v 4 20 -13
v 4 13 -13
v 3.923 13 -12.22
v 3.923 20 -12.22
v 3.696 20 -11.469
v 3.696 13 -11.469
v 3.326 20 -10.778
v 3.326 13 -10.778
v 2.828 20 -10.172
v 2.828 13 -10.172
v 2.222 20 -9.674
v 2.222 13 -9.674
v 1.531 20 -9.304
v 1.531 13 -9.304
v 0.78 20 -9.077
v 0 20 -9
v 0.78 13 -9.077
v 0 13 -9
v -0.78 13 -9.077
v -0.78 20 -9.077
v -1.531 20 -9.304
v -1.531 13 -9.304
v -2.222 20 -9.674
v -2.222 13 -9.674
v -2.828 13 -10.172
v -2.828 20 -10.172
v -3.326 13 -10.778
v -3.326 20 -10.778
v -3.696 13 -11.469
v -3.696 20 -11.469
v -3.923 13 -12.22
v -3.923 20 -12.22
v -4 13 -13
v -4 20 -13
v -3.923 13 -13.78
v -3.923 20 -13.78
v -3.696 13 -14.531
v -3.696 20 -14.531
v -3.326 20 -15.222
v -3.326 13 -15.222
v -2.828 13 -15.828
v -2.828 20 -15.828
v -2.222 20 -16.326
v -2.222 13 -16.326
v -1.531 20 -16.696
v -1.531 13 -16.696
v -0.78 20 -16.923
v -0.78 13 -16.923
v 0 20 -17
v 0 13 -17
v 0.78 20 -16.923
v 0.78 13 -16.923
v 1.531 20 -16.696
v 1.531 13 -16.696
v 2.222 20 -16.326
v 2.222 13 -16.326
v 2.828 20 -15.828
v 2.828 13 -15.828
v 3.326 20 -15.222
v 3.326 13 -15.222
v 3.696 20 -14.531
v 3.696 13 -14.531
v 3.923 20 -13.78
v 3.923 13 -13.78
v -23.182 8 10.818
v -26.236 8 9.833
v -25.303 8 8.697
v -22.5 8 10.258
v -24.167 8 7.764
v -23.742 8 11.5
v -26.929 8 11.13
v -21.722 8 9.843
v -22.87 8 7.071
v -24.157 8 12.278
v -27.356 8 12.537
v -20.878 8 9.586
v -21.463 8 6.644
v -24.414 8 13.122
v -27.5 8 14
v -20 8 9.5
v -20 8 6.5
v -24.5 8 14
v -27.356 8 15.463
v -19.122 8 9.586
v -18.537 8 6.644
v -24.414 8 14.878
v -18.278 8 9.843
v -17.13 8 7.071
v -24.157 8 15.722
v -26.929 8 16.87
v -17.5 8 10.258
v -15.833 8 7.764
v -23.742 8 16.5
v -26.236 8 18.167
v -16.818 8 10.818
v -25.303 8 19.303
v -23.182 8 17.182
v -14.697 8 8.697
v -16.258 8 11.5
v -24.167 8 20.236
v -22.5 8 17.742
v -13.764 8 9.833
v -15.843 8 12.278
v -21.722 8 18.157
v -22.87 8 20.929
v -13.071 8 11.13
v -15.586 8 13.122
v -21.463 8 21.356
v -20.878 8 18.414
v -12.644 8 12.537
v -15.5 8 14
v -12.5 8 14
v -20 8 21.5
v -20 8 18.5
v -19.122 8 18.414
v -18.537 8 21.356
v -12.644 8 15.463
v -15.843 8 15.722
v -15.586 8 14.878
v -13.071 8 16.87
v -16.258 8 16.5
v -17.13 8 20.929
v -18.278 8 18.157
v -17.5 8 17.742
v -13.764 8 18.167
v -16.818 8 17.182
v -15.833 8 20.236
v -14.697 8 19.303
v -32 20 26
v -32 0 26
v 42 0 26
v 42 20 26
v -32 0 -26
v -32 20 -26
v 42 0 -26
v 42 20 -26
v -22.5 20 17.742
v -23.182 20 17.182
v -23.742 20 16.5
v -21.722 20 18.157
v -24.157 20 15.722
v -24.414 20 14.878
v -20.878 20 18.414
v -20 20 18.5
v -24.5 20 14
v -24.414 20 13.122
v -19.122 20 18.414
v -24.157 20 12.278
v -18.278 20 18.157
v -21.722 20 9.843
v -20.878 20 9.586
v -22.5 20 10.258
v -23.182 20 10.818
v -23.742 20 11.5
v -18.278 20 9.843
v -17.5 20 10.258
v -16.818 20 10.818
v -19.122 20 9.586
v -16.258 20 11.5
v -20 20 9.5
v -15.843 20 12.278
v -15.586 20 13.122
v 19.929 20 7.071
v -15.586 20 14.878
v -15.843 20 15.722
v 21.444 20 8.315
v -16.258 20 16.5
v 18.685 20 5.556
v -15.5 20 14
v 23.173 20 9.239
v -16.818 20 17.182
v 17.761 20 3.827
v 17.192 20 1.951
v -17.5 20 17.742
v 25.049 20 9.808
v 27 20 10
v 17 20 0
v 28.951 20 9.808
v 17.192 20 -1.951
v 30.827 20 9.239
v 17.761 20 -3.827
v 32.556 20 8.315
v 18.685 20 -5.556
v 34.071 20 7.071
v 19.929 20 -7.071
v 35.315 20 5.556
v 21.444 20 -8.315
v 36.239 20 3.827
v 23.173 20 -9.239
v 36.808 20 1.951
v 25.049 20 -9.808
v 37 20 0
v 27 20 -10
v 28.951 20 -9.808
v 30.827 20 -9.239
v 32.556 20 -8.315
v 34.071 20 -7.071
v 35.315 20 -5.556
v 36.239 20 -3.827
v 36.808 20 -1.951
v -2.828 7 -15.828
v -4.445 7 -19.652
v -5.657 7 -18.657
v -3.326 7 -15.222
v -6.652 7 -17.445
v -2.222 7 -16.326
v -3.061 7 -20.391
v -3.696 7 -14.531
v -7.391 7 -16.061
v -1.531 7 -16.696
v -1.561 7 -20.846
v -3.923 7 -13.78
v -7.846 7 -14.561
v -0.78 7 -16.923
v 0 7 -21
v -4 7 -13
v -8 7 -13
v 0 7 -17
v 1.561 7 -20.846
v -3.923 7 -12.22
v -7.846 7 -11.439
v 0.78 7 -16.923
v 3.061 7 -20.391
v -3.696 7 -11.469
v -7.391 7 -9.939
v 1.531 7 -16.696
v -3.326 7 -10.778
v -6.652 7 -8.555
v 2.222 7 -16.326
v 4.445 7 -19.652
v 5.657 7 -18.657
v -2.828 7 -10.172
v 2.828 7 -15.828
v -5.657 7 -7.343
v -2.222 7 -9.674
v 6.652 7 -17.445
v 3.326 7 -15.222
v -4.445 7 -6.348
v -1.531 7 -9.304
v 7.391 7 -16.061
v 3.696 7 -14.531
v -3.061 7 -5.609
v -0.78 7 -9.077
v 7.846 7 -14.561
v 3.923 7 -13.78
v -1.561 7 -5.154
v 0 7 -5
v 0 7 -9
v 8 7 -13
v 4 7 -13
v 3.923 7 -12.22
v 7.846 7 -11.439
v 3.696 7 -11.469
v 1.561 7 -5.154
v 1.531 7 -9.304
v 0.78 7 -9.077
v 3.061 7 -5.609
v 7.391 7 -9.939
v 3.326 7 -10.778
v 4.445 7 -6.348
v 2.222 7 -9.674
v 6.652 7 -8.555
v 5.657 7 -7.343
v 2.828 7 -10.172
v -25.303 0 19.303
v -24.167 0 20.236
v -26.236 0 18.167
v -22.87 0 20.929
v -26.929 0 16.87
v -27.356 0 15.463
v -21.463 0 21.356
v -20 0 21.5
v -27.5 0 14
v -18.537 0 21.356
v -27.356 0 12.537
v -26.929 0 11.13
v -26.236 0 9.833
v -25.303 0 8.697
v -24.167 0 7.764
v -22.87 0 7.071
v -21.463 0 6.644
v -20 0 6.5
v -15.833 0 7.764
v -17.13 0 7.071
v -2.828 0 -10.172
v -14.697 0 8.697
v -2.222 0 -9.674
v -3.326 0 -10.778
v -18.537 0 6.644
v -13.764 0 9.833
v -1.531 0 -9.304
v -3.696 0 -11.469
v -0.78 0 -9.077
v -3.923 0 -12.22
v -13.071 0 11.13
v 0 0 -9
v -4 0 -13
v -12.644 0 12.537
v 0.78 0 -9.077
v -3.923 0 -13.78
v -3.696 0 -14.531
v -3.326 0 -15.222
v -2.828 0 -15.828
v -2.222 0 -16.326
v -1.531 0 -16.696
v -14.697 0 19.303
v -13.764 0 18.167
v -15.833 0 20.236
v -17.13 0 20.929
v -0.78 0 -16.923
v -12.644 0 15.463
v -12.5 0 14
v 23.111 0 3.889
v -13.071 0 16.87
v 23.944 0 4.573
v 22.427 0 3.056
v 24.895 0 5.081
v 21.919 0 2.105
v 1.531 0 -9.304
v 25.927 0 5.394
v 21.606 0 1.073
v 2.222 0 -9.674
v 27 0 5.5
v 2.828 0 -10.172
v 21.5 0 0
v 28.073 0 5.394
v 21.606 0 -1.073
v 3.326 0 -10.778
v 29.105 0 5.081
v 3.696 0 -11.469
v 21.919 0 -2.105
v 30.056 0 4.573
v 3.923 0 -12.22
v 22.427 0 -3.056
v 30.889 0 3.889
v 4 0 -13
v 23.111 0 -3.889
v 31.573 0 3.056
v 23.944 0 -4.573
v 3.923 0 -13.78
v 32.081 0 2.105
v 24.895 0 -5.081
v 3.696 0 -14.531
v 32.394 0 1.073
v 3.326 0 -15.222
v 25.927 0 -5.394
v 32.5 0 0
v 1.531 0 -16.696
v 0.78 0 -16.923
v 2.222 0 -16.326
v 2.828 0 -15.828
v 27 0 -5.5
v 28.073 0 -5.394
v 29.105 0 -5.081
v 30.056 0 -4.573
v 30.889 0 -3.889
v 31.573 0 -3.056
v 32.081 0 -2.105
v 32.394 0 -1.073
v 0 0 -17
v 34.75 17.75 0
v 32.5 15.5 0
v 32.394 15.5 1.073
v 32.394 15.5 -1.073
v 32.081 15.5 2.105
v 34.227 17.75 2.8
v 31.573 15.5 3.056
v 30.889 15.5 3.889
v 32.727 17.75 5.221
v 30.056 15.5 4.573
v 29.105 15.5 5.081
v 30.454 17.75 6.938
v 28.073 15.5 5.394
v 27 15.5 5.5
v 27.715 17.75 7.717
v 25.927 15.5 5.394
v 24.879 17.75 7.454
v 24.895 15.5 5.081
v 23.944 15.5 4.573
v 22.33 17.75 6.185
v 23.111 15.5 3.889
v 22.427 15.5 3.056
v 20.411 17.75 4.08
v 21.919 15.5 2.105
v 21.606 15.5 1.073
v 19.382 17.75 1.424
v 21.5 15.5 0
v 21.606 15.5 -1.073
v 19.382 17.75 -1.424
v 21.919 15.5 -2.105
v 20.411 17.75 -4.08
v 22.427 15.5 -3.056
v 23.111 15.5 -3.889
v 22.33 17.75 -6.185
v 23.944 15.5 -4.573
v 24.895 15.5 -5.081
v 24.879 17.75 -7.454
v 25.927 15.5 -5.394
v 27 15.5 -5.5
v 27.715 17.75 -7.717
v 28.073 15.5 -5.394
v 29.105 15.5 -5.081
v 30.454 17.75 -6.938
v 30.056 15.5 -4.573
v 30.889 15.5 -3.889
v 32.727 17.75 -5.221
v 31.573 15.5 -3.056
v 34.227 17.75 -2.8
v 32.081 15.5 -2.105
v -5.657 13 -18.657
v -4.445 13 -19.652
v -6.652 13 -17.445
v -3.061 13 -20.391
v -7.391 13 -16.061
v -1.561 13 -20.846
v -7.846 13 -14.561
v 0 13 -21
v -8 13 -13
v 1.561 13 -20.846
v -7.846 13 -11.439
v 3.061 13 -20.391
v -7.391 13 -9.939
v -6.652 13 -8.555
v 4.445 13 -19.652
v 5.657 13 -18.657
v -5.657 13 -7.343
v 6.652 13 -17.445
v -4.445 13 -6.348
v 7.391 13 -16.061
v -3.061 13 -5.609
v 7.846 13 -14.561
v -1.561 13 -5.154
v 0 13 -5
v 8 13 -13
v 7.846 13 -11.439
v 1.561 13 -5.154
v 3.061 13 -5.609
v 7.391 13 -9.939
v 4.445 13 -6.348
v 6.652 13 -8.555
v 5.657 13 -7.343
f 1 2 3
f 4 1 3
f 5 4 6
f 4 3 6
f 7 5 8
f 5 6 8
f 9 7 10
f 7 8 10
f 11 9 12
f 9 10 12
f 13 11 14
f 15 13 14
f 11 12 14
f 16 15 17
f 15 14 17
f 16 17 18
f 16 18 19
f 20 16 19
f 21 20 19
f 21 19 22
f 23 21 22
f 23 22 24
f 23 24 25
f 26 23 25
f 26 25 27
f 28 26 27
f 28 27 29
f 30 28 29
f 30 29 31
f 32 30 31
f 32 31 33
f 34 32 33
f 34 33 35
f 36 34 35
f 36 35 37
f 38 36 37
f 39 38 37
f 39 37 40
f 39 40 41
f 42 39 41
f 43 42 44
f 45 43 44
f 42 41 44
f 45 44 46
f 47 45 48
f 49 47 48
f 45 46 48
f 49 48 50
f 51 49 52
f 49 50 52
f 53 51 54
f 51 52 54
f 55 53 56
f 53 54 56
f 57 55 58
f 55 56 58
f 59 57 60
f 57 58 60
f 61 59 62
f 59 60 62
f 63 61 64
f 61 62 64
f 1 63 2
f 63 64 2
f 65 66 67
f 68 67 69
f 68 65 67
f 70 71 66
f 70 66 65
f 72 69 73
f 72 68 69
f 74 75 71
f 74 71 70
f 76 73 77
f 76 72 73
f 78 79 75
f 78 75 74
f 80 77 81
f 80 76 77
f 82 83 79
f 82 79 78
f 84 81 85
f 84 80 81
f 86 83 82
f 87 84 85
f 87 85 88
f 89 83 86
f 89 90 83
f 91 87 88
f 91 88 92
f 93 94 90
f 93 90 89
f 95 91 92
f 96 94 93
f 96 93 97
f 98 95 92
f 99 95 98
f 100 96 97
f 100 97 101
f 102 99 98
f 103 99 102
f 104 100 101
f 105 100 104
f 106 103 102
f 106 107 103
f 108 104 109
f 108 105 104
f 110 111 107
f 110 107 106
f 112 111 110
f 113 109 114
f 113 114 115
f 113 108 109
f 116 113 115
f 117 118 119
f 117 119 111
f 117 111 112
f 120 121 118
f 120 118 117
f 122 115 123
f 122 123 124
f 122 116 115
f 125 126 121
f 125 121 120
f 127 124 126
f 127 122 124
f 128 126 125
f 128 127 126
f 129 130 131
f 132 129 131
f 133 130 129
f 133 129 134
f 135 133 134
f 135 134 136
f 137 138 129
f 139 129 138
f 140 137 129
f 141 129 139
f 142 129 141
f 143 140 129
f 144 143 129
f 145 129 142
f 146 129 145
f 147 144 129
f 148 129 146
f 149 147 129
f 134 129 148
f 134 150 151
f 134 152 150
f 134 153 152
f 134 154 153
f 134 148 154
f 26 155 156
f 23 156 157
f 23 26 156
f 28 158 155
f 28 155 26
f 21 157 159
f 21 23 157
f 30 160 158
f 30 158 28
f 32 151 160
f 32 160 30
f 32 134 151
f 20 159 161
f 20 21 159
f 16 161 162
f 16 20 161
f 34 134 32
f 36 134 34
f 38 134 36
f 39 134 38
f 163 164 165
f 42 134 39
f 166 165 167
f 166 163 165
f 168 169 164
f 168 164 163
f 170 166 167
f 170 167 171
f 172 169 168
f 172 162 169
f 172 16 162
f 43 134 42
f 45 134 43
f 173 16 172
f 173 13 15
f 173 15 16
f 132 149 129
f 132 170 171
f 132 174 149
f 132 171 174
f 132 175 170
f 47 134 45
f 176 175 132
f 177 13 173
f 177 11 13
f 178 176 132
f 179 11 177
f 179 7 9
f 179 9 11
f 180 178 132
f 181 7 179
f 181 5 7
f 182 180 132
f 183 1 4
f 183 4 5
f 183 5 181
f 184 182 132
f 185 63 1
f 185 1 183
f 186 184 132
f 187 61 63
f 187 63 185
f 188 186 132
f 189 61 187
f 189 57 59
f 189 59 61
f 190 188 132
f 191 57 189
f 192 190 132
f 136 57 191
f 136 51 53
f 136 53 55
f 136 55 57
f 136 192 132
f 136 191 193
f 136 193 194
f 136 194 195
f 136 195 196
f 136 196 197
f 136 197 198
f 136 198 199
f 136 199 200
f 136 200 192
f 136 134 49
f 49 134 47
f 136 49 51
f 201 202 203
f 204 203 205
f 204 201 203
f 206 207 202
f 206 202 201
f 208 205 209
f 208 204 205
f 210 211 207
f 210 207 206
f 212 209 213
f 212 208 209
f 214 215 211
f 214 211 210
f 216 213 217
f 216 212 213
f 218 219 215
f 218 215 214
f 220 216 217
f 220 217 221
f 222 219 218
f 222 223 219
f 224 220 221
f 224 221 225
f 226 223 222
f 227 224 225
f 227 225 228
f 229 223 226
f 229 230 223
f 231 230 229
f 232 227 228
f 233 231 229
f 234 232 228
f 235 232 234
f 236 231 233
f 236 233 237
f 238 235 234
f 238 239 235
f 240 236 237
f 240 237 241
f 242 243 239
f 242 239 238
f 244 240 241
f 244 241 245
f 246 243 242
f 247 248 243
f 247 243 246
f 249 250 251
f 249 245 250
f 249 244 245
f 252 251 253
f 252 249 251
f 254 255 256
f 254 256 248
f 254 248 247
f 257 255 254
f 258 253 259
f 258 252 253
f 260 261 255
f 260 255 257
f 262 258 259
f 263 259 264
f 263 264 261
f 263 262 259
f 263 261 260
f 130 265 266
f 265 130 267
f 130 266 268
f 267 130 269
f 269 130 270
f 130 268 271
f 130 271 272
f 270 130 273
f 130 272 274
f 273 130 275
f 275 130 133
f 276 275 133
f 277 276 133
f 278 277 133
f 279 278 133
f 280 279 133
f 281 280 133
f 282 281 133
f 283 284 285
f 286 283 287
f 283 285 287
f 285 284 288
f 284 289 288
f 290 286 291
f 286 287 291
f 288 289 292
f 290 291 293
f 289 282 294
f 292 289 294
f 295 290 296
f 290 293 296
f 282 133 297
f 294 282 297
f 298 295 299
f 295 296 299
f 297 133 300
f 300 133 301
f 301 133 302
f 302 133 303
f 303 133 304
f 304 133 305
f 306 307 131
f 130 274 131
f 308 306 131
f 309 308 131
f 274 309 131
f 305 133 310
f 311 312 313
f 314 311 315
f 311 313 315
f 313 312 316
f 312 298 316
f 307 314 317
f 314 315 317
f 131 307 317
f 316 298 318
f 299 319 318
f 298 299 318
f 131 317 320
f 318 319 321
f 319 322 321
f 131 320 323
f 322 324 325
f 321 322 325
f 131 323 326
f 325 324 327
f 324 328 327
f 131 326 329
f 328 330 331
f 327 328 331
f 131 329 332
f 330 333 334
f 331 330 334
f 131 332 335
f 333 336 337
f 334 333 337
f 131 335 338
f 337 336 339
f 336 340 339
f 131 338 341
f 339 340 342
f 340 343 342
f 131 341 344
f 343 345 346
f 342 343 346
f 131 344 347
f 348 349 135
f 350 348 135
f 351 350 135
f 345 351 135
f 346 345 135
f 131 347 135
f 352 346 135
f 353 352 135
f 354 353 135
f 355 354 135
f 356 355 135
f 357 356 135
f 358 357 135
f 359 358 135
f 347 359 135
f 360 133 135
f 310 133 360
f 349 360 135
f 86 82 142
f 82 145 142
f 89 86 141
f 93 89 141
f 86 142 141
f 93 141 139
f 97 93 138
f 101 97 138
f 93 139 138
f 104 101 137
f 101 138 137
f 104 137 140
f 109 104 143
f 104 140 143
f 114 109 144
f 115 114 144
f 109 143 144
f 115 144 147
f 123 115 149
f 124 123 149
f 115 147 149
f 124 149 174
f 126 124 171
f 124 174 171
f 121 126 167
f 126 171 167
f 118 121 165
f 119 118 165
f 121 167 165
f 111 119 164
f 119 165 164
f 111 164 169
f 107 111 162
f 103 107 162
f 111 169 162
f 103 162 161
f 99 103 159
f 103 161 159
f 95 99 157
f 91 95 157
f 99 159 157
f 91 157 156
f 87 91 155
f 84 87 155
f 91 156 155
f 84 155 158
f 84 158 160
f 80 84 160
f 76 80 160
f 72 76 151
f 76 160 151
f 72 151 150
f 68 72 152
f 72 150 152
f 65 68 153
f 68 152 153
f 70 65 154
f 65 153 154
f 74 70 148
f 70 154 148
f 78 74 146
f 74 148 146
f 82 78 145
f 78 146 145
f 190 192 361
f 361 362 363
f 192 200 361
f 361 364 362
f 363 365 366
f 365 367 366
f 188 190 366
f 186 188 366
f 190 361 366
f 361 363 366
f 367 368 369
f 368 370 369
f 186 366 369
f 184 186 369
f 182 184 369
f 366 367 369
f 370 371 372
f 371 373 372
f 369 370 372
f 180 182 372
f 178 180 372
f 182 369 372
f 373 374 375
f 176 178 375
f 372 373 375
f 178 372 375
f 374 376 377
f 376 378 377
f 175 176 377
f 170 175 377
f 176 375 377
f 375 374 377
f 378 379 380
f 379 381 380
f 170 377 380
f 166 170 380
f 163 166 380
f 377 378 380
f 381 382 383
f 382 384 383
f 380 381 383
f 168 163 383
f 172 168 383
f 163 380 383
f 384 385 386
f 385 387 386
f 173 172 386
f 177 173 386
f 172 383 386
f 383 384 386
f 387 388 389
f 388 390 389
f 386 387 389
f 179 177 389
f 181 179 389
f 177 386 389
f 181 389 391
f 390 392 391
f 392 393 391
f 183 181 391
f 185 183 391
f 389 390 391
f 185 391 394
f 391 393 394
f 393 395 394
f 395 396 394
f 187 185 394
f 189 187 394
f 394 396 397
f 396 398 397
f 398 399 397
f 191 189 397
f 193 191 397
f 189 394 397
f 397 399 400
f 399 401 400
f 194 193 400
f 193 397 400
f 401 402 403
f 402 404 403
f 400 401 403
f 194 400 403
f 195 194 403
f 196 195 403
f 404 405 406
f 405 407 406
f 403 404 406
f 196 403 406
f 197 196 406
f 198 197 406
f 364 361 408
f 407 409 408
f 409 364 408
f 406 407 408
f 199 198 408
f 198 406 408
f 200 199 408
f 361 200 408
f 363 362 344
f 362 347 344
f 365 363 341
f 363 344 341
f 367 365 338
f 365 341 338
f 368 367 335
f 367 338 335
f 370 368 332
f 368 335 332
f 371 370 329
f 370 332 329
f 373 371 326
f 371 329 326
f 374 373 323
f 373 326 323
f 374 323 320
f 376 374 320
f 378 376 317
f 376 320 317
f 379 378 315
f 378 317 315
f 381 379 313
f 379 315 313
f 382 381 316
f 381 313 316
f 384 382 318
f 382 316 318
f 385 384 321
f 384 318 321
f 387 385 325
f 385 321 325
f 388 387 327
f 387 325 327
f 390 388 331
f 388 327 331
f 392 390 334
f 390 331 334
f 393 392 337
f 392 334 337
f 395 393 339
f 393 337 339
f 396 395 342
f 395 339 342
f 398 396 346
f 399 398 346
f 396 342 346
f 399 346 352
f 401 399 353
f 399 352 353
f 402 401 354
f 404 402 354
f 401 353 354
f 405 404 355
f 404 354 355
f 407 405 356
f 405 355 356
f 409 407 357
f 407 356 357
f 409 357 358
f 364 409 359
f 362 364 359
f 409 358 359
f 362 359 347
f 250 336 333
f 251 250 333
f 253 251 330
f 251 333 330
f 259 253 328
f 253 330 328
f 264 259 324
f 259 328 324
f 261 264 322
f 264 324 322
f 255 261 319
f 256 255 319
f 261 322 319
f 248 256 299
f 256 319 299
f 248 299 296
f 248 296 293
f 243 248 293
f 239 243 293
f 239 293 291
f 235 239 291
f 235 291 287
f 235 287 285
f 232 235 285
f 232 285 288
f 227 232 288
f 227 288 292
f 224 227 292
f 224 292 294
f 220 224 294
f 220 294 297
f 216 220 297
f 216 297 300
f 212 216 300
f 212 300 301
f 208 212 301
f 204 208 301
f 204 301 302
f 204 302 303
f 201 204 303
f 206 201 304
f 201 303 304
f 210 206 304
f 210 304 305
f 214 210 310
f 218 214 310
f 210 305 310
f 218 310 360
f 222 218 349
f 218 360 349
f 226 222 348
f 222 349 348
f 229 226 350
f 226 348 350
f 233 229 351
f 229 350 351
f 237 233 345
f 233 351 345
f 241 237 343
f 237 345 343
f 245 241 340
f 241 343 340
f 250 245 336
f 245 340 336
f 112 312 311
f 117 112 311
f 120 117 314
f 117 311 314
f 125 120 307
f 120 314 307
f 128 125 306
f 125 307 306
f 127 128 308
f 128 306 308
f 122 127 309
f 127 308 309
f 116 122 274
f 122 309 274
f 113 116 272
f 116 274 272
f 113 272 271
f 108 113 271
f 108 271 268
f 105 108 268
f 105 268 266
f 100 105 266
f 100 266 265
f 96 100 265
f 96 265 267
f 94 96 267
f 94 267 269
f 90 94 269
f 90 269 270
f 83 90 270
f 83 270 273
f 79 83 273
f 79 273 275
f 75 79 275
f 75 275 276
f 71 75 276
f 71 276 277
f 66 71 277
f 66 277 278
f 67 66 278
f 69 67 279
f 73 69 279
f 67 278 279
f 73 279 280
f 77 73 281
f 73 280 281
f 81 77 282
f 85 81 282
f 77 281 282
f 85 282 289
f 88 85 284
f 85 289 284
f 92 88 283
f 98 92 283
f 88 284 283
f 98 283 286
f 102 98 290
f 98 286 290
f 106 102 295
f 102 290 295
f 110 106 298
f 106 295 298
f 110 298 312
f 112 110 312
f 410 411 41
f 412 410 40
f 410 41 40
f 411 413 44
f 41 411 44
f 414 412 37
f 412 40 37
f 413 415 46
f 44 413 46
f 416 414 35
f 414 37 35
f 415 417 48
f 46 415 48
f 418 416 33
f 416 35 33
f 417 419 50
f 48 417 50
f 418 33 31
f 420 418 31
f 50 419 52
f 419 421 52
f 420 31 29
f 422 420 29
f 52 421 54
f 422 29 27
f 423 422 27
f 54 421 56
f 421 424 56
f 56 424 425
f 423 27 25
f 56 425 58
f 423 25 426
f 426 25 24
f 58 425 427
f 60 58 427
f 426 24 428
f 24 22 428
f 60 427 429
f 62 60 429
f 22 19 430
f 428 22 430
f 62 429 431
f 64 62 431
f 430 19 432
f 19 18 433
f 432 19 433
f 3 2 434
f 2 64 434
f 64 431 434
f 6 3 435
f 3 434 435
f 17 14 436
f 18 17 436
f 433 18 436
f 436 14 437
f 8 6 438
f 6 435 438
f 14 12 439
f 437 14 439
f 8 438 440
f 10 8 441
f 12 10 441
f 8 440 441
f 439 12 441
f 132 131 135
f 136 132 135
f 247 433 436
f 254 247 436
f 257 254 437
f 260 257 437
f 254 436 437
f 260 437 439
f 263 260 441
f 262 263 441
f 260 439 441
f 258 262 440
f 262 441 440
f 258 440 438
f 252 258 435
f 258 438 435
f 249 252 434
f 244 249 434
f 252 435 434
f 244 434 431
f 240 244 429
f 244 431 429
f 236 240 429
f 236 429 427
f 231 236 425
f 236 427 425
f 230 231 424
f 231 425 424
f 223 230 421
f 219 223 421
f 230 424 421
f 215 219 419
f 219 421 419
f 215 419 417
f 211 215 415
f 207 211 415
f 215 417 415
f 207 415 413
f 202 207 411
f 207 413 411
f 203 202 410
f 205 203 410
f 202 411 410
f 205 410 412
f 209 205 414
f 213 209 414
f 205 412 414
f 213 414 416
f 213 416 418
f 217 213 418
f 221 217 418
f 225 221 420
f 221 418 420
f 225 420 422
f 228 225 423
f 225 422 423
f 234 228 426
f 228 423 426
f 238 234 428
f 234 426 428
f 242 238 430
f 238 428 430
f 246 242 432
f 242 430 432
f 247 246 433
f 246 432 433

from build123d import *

# Parameters (mm, degrees)
SKETCH1_W                                        = 74
SKETCH1_H                                        = 52
EXTRUDE1_DEPTH                                   = 20
CSK_FOR_M10_FLAT_HEAD_MACHINE_SCREW1_D           = 11
CSK_FOR_M10_FLAT_HEAD_MACHINE_SCREW1_CSINK_D     = 20
CSK_FOR_M10_FLAT_HEAD_MACHINE_SCREW1_CSINK_ANGLE = 90
F_8_0_8_DIAMETER_HOLE1_D                         = 8
CBORE_FOR_M8_SHCS1_D                             = 9
CBORE_FOR_M8_SHCS1_CBORE_D                       = 15
CBORE_FOR_M8_SHCS1_CBORE_DEPTH                   = 8
SKETCH8_R                                        = 8
CUT_EXTRUDE1_DEPTH                               = 6


with BuildPart() as part:
    # Sketch1 → Extrude1 (new body)
    with BuildSketch(Plane(origin=(0, 0, 0), x_dir=(1, 0, 0), z_dir=(0, 1, 0))):
        with Locations((5, 0)):
            Rectangle(SKETCH1_W, SKETCH1_H)
    extrude(amount=EXTRUDE1_DEPTH)

    # CSK for M10 Flat Head Machine Screw1 (through all)
    with Locations(Plane(origin=(0, 20, 0), x_dir=(-1, 0, 0), z_dir=(0, 1, 0))):
        with Locations((-27, 0)):
            CounterSinkHole(CSK_FOR_M10_FLAT_HEAD_MACHINE_SCREW1_D / 2, CSK_FOR_M10_FLAT_HEAD_MACHINE_SCREW1_CSINK_D / 2, counter_sink_angle=CSK_FOR_M10_FLAT_HEAD_MACHINE_SCREW1_CSINK_ANGLE)

    # Ø8.0 (8) Diameter Hole1 (through all)
    with Locations(Plane(origin=(0, 20, 0), x_dir=(-1, 0, 0), z_dir=(0, 1, 0))):
        with Locations((0, -13)):
            Hole(F_8_0_8_DIAMETER_HOLE1_D / 2)

    # CBORE for M8 SHCS1 (through all)
    with Locations(Plane.XZ):
        with Locations((-20, 14)):
            CounterBoreHole(CBORE_FOR_M8_SHCS1_D / 2, CBORE_FOR_M8_SHCS1_CBORE_D / 2, CBORE_FOR_M8_SHCS1_CBORE_DEPTH)

    # Sketch8 → Cut-Extrude1 (cut)
    with BuildSketch(Plane(origin=(0, 13, 0), x_dir=(-1, 0, 0), z_dir=(0, 1, 0))):
        with Locations(Location((0, -13, 0), (0, 0, 90))):
            Circle(SKETCH8_R)
    extrude(amount=-CUT_EXTRUDE1_DEPTH, mode=Mode.SUBTRACT)


solid = part.part
